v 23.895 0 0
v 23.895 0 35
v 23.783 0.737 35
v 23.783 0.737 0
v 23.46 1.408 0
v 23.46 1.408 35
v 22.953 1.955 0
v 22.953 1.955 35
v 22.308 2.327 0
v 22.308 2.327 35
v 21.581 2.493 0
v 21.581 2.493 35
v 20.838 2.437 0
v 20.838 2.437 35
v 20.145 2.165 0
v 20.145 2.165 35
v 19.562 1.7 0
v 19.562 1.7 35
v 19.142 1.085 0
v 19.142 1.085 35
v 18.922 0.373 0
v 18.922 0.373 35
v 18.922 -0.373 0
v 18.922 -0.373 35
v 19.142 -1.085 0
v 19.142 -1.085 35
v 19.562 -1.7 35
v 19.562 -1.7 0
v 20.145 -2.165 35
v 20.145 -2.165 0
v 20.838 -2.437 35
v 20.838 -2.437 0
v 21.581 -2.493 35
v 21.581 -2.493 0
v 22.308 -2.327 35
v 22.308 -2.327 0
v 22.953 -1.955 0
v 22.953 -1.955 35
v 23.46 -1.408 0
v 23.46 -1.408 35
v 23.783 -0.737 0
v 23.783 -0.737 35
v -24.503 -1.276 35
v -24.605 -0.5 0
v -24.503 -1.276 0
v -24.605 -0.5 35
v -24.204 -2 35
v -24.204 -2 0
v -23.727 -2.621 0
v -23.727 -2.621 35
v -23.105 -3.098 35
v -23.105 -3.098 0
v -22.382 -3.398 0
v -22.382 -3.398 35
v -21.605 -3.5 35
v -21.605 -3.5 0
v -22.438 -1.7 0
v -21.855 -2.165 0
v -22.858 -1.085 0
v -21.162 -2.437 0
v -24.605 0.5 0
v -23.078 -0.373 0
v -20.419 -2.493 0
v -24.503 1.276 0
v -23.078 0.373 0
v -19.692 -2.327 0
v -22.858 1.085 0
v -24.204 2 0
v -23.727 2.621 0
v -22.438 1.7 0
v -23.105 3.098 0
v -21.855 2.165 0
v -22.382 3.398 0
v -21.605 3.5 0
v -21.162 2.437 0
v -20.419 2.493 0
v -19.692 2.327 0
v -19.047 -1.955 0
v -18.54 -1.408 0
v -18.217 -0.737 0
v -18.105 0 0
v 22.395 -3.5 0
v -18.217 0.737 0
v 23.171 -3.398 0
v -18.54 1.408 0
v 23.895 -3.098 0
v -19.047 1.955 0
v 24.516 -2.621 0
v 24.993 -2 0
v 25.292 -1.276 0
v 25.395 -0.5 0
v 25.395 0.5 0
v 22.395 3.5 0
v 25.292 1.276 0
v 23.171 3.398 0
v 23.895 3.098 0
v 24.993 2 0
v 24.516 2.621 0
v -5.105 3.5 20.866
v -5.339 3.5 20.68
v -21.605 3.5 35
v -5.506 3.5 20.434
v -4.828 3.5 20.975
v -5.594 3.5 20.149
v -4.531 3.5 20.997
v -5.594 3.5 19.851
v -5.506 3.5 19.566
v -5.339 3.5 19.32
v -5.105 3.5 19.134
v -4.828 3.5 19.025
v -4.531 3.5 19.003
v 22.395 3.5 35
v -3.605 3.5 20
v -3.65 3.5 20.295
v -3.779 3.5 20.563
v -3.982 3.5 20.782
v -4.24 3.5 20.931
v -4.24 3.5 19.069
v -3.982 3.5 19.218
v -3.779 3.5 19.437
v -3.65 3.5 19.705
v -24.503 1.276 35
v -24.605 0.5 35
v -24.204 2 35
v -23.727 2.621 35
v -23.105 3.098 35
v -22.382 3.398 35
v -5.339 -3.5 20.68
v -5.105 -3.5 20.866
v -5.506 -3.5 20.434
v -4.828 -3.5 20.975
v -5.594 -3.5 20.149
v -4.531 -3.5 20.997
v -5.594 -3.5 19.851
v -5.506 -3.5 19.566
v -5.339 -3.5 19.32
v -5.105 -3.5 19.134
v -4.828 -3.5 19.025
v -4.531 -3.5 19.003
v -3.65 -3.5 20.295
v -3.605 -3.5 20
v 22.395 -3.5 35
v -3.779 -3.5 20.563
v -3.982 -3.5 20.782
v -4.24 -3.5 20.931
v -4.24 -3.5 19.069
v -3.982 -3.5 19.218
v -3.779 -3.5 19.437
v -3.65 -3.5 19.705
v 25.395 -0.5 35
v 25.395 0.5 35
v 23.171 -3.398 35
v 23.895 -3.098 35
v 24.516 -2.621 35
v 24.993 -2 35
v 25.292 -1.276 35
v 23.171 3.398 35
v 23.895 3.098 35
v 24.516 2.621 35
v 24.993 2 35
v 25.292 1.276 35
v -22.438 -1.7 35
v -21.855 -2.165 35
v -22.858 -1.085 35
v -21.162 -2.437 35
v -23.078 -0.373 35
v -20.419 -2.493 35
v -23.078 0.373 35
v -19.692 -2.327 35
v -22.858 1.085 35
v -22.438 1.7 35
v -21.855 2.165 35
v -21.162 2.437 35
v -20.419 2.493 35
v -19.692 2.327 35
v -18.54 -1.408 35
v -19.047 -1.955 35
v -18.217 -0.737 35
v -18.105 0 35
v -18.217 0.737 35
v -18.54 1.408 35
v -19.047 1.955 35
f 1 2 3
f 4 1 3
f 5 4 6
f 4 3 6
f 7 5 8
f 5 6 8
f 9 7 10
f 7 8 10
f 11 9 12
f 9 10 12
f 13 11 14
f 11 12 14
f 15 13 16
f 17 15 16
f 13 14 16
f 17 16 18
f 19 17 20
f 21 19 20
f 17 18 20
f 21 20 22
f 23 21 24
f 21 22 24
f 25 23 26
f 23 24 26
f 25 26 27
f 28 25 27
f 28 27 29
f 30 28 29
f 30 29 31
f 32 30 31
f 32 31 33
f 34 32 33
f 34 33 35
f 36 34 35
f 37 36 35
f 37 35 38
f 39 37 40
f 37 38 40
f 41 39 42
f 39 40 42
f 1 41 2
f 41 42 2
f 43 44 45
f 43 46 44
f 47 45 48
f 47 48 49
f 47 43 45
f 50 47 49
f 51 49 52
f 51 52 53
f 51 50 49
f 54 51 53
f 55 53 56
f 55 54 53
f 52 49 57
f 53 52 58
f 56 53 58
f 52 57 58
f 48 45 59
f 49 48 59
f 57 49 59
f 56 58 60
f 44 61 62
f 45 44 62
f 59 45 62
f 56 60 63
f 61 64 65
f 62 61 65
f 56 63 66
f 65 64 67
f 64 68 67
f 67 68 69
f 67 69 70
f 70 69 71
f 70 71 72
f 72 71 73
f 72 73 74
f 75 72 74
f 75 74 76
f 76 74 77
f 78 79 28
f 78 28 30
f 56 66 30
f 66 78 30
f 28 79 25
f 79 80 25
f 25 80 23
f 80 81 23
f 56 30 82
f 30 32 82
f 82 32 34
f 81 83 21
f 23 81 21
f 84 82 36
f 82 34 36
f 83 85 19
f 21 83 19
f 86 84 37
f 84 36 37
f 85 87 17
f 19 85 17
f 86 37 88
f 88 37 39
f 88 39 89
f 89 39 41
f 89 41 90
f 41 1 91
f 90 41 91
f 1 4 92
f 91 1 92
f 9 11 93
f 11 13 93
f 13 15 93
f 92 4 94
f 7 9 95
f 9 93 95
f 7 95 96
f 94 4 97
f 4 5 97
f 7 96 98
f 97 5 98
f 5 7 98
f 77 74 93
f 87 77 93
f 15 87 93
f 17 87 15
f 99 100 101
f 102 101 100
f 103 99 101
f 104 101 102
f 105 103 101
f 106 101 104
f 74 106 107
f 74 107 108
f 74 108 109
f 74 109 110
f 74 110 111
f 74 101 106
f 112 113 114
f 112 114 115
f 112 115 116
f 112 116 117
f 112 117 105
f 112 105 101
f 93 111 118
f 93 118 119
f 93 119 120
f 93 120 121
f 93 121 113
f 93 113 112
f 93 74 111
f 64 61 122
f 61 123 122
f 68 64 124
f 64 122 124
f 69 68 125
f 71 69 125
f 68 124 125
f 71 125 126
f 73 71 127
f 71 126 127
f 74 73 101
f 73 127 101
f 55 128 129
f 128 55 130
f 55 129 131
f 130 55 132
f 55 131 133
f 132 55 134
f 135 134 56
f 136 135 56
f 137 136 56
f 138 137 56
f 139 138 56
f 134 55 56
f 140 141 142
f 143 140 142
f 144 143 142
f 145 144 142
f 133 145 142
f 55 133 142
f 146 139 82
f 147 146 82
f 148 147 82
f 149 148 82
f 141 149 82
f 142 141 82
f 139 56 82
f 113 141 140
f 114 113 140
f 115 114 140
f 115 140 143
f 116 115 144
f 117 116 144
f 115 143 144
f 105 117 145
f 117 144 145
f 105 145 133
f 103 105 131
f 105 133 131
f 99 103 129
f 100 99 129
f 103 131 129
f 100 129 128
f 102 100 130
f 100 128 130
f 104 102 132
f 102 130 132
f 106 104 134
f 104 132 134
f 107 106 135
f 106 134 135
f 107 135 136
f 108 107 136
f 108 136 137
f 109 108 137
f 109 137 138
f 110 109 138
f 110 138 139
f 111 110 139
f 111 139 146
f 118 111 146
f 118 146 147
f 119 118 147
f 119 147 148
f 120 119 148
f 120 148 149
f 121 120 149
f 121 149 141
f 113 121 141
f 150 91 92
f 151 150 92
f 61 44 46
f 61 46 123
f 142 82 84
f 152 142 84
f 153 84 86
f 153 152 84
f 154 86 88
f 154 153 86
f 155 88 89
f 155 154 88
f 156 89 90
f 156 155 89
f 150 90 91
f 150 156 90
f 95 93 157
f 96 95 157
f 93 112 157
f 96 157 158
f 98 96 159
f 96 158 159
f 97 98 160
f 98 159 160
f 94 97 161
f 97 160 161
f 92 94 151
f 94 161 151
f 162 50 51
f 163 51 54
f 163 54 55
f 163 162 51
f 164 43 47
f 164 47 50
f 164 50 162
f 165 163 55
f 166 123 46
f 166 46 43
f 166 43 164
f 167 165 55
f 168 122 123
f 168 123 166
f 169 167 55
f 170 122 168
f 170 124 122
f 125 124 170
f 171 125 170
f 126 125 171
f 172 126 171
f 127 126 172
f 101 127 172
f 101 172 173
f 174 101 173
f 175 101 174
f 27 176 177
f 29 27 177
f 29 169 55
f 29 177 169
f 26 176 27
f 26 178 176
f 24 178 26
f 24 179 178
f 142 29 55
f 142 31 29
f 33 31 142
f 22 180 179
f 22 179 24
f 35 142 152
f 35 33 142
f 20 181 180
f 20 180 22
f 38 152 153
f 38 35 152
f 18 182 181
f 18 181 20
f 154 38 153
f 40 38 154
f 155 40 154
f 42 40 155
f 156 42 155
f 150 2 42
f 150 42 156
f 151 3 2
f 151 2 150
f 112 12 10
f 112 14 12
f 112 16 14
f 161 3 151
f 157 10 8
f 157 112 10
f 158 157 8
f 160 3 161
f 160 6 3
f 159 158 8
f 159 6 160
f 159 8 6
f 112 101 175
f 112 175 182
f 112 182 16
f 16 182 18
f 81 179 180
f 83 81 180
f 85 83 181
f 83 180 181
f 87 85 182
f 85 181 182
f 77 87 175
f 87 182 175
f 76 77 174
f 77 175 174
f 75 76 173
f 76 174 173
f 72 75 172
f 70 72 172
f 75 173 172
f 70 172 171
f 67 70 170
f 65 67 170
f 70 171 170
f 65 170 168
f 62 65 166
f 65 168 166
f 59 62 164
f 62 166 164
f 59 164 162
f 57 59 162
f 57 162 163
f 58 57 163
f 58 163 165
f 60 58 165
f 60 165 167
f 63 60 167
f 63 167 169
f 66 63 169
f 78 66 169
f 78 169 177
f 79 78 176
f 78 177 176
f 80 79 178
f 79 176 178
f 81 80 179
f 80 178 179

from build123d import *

# Parameters (mm, degrees)
F0_W     = 50
F0_H     = 7
F1_DEPTH = 35
F2_R     = 2.5
F3_DEPTH = 35
F4_R     = 3
F5_R     = 1
F6_DEPTH = 25


with BuildPart() as f1:
    # F0 (on Top) → F1 (new body)
    with BuildSketch(Plane.XY):
        with Locations((0.394545, 0)):
            Rectangle(F0_W, F0_H)
    extrude(amount=F1_DEPTH)

    # F2 (on face) → F3 (cut, through all)
    with BuildSketch(Plane.XY.offset(35)):
        with Locations((-20.605455, 0)):
            Circle(F2_R)
        with Locations((21.394545, 0)):
            Circle(F2_R)
    extrude(amount=-F3_DEPTH, mode=Mode.SUBTRACT)

    # F4
    f4_edges = [f1.edges().sort_by_distance(p)[0] for p in [
        (25.394545, -3.5, 17.5),
        (25.394545, 3.5, 17.5),
        (-24.605455, -3.5, 17.5),
        (-24.605455, 3.5, 17.5),
    ]]
    fillet(f4_edges, radius=F4_R)

    # F5 (on face) → F6 (cut)
    with BuildSketch(Plane.XZ.offset(3.5)):
        with Locations((-4.605455, 20)):
            Circle(F5_R)
    extrude(amount=-F6_DEPTH, mode=Mode.SUBTRACT)


solid = f1.part
